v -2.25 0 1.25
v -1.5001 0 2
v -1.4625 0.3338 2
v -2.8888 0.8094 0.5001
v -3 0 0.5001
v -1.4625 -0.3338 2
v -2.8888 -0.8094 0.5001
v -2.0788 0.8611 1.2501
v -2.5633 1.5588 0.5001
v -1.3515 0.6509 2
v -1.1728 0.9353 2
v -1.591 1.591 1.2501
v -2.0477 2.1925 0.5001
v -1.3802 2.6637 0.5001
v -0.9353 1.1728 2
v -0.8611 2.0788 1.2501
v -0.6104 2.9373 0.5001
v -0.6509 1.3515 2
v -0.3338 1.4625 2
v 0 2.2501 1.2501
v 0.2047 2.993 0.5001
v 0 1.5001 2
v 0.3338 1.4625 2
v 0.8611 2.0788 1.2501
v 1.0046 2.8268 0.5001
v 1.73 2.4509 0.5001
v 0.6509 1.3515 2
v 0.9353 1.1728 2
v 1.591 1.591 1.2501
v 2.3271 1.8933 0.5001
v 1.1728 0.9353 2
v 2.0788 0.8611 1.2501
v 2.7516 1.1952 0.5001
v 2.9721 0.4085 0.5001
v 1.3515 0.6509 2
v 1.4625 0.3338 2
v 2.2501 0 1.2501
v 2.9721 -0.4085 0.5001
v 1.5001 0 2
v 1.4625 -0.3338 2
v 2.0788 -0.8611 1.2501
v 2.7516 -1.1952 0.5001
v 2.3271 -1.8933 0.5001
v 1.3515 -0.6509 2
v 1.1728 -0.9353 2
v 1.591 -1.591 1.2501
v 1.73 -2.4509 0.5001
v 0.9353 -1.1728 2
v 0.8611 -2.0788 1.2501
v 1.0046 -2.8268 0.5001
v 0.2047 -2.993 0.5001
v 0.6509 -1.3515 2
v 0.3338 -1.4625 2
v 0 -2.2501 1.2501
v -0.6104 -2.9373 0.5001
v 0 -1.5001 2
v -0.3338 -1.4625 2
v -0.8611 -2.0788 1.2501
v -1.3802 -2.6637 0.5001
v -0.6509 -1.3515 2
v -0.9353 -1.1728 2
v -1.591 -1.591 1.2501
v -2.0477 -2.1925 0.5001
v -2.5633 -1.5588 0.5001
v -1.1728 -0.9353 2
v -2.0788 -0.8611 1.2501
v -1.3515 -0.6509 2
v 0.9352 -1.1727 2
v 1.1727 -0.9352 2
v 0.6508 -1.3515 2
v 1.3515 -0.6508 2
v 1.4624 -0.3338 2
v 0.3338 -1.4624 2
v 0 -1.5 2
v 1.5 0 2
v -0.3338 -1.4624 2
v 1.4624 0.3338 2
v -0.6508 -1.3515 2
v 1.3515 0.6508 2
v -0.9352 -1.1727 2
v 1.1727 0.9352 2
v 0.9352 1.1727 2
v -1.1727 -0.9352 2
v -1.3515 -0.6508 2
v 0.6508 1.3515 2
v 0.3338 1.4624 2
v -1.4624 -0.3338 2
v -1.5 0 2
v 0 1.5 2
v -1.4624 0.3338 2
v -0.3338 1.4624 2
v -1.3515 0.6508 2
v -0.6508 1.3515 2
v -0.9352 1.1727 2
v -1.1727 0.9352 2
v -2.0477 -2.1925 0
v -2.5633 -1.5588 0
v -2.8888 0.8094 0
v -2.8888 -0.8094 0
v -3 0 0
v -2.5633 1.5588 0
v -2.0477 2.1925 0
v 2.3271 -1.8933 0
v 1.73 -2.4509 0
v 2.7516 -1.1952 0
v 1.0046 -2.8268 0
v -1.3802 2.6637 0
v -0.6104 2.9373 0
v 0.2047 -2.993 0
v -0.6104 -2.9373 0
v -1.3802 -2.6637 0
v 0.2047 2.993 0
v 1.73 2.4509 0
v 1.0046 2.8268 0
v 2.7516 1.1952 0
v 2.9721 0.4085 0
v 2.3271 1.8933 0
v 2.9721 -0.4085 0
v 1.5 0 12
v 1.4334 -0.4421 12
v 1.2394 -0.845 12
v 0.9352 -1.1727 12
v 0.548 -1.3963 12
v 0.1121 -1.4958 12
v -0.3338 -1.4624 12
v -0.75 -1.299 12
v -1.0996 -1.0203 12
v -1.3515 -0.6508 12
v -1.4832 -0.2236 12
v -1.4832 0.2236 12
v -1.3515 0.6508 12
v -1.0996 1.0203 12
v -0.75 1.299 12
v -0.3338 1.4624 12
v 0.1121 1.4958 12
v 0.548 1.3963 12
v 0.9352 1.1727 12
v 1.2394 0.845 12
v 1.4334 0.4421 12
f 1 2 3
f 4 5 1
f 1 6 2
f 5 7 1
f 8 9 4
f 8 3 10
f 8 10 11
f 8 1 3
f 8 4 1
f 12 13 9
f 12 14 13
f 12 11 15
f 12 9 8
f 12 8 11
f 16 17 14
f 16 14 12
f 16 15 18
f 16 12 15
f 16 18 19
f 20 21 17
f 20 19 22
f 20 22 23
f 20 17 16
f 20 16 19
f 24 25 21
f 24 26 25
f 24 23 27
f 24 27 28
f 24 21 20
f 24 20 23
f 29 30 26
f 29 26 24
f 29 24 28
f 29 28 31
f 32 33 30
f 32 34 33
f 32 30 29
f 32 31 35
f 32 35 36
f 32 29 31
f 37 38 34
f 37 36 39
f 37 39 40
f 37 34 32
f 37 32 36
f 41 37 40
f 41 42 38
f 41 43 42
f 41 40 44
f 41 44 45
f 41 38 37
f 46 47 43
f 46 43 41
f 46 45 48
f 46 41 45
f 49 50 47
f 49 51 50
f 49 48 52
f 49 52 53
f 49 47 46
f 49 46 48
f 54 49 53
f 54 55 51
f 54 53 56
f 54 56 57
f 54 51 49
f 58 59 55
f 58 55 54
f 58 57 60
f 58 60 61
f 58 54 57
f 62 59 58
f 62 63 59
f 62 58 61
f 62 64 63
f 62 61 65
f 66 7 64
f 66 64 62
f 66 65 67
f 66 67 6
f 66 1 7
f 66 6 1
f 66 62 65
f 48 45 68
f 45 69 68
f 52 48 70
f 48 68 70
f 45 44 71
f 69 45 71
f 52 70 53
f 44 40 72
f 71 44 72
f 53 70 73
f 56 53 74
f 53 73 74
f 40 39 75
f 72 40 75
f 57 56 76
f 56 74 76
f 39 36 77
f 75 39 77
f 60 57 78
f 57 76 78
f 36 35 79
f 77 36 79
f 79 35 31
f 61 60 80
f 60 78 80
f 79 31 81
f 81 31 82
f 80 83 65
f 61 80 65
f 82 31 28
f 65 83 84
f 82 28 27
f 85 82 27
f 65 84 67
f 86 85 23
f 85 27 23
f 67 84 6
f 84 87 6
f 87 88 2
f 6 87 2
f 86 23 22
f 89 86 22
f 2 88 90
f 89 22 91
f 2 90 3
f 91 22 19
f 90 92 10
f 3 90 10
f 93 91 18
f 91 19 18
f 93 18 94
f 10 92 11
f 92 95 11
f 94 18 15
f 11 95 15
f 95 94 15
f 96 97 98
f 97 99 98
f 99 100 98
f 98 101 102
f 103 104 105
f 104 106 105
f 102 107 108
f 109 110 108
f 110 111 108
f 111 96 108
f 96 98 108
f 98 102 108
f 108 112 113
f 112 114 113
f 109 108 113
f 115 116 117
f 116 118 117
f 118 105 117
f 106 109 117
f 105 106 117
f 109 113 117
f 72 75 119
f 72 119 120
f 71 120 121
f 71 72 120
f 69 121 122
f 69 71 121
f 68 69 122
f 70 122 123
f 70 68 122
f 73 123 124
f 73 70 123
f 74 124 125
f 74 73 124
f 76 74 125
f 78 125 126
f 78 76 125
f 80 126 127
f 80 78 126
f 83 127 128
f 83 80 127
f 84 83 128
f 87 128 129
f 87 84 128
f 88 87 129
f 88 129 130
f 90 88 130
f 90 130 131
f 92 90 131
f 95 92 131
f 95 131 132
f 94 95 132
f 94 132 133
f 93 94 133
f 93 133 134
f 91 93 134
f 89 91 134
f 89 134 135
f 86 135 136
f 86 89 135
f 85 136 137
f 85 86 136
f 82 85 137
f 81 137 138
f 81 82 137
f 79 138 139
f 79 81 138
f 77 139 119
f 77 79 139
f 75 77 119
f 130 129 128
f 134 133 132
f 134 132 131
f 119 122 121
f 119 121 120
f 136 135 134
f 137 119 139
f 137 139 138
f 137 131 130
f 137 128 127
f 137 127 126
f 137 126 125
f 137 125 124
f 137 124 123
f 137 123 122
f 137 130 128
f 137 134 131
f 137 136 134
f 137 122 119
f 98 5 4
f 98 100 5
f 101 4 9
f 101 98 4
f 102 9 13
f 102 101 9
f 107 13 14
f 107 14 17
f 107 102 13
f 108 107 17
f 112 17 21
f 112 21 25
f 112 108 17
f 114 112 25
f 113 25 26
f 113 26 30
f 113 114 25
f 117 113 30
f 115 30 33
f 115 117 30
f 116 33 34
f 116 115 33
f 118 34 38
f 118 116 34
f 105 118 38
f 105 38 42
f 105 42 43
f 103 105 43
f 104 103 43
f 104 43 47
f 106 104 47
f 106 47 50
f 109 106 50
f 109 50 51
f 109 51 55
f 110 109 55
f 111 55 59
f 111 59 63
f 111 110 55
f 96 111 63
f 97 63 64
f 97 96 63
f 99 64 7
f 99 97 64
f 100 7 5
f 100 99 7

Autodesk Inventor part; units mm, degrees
ref_plane "YZ Plane" through (0, 0, 0) normal (1, 0, 0) x (0, 1, 0)
ref_plane "XZ Plane" through (0, 0, 0) normal (0, 1, 0) x (-1, 0, 0)
ref_plane "XY Plane" through (0, 0, 0) normal (0, 0, 1) x (1, 0, 0)
sketch "スケッチ1" plane through (0, 0, 0) normal (0, 0, 1) x (1, 0, 0)
  circle A0 centre (0, 0) radius 1.5
  dimension "d0" = 3
extrude "押し出し1" add sketch "スケッチ1" along normal blind 12
sketch "スケッチ2" plane through (0, 0, 0) normal (0, 0, -1) x (-1, 0, 0)
  circle A0 centre (0, 0) radius 3
  dimension "d3" = 6
extrude "押し出し2" add sketch "スケッチ2" against normal blind 2
thread "ねじ1" size "M3x0.5" class "6g" standard "ANSI Metric M Profile" full length
chamfer "面取り1" distance 1.5 angle 45 1 edges at (3, 0, 2)
properties part number "ネジ皿m3,12" material "鋼、高強度、低合金"
